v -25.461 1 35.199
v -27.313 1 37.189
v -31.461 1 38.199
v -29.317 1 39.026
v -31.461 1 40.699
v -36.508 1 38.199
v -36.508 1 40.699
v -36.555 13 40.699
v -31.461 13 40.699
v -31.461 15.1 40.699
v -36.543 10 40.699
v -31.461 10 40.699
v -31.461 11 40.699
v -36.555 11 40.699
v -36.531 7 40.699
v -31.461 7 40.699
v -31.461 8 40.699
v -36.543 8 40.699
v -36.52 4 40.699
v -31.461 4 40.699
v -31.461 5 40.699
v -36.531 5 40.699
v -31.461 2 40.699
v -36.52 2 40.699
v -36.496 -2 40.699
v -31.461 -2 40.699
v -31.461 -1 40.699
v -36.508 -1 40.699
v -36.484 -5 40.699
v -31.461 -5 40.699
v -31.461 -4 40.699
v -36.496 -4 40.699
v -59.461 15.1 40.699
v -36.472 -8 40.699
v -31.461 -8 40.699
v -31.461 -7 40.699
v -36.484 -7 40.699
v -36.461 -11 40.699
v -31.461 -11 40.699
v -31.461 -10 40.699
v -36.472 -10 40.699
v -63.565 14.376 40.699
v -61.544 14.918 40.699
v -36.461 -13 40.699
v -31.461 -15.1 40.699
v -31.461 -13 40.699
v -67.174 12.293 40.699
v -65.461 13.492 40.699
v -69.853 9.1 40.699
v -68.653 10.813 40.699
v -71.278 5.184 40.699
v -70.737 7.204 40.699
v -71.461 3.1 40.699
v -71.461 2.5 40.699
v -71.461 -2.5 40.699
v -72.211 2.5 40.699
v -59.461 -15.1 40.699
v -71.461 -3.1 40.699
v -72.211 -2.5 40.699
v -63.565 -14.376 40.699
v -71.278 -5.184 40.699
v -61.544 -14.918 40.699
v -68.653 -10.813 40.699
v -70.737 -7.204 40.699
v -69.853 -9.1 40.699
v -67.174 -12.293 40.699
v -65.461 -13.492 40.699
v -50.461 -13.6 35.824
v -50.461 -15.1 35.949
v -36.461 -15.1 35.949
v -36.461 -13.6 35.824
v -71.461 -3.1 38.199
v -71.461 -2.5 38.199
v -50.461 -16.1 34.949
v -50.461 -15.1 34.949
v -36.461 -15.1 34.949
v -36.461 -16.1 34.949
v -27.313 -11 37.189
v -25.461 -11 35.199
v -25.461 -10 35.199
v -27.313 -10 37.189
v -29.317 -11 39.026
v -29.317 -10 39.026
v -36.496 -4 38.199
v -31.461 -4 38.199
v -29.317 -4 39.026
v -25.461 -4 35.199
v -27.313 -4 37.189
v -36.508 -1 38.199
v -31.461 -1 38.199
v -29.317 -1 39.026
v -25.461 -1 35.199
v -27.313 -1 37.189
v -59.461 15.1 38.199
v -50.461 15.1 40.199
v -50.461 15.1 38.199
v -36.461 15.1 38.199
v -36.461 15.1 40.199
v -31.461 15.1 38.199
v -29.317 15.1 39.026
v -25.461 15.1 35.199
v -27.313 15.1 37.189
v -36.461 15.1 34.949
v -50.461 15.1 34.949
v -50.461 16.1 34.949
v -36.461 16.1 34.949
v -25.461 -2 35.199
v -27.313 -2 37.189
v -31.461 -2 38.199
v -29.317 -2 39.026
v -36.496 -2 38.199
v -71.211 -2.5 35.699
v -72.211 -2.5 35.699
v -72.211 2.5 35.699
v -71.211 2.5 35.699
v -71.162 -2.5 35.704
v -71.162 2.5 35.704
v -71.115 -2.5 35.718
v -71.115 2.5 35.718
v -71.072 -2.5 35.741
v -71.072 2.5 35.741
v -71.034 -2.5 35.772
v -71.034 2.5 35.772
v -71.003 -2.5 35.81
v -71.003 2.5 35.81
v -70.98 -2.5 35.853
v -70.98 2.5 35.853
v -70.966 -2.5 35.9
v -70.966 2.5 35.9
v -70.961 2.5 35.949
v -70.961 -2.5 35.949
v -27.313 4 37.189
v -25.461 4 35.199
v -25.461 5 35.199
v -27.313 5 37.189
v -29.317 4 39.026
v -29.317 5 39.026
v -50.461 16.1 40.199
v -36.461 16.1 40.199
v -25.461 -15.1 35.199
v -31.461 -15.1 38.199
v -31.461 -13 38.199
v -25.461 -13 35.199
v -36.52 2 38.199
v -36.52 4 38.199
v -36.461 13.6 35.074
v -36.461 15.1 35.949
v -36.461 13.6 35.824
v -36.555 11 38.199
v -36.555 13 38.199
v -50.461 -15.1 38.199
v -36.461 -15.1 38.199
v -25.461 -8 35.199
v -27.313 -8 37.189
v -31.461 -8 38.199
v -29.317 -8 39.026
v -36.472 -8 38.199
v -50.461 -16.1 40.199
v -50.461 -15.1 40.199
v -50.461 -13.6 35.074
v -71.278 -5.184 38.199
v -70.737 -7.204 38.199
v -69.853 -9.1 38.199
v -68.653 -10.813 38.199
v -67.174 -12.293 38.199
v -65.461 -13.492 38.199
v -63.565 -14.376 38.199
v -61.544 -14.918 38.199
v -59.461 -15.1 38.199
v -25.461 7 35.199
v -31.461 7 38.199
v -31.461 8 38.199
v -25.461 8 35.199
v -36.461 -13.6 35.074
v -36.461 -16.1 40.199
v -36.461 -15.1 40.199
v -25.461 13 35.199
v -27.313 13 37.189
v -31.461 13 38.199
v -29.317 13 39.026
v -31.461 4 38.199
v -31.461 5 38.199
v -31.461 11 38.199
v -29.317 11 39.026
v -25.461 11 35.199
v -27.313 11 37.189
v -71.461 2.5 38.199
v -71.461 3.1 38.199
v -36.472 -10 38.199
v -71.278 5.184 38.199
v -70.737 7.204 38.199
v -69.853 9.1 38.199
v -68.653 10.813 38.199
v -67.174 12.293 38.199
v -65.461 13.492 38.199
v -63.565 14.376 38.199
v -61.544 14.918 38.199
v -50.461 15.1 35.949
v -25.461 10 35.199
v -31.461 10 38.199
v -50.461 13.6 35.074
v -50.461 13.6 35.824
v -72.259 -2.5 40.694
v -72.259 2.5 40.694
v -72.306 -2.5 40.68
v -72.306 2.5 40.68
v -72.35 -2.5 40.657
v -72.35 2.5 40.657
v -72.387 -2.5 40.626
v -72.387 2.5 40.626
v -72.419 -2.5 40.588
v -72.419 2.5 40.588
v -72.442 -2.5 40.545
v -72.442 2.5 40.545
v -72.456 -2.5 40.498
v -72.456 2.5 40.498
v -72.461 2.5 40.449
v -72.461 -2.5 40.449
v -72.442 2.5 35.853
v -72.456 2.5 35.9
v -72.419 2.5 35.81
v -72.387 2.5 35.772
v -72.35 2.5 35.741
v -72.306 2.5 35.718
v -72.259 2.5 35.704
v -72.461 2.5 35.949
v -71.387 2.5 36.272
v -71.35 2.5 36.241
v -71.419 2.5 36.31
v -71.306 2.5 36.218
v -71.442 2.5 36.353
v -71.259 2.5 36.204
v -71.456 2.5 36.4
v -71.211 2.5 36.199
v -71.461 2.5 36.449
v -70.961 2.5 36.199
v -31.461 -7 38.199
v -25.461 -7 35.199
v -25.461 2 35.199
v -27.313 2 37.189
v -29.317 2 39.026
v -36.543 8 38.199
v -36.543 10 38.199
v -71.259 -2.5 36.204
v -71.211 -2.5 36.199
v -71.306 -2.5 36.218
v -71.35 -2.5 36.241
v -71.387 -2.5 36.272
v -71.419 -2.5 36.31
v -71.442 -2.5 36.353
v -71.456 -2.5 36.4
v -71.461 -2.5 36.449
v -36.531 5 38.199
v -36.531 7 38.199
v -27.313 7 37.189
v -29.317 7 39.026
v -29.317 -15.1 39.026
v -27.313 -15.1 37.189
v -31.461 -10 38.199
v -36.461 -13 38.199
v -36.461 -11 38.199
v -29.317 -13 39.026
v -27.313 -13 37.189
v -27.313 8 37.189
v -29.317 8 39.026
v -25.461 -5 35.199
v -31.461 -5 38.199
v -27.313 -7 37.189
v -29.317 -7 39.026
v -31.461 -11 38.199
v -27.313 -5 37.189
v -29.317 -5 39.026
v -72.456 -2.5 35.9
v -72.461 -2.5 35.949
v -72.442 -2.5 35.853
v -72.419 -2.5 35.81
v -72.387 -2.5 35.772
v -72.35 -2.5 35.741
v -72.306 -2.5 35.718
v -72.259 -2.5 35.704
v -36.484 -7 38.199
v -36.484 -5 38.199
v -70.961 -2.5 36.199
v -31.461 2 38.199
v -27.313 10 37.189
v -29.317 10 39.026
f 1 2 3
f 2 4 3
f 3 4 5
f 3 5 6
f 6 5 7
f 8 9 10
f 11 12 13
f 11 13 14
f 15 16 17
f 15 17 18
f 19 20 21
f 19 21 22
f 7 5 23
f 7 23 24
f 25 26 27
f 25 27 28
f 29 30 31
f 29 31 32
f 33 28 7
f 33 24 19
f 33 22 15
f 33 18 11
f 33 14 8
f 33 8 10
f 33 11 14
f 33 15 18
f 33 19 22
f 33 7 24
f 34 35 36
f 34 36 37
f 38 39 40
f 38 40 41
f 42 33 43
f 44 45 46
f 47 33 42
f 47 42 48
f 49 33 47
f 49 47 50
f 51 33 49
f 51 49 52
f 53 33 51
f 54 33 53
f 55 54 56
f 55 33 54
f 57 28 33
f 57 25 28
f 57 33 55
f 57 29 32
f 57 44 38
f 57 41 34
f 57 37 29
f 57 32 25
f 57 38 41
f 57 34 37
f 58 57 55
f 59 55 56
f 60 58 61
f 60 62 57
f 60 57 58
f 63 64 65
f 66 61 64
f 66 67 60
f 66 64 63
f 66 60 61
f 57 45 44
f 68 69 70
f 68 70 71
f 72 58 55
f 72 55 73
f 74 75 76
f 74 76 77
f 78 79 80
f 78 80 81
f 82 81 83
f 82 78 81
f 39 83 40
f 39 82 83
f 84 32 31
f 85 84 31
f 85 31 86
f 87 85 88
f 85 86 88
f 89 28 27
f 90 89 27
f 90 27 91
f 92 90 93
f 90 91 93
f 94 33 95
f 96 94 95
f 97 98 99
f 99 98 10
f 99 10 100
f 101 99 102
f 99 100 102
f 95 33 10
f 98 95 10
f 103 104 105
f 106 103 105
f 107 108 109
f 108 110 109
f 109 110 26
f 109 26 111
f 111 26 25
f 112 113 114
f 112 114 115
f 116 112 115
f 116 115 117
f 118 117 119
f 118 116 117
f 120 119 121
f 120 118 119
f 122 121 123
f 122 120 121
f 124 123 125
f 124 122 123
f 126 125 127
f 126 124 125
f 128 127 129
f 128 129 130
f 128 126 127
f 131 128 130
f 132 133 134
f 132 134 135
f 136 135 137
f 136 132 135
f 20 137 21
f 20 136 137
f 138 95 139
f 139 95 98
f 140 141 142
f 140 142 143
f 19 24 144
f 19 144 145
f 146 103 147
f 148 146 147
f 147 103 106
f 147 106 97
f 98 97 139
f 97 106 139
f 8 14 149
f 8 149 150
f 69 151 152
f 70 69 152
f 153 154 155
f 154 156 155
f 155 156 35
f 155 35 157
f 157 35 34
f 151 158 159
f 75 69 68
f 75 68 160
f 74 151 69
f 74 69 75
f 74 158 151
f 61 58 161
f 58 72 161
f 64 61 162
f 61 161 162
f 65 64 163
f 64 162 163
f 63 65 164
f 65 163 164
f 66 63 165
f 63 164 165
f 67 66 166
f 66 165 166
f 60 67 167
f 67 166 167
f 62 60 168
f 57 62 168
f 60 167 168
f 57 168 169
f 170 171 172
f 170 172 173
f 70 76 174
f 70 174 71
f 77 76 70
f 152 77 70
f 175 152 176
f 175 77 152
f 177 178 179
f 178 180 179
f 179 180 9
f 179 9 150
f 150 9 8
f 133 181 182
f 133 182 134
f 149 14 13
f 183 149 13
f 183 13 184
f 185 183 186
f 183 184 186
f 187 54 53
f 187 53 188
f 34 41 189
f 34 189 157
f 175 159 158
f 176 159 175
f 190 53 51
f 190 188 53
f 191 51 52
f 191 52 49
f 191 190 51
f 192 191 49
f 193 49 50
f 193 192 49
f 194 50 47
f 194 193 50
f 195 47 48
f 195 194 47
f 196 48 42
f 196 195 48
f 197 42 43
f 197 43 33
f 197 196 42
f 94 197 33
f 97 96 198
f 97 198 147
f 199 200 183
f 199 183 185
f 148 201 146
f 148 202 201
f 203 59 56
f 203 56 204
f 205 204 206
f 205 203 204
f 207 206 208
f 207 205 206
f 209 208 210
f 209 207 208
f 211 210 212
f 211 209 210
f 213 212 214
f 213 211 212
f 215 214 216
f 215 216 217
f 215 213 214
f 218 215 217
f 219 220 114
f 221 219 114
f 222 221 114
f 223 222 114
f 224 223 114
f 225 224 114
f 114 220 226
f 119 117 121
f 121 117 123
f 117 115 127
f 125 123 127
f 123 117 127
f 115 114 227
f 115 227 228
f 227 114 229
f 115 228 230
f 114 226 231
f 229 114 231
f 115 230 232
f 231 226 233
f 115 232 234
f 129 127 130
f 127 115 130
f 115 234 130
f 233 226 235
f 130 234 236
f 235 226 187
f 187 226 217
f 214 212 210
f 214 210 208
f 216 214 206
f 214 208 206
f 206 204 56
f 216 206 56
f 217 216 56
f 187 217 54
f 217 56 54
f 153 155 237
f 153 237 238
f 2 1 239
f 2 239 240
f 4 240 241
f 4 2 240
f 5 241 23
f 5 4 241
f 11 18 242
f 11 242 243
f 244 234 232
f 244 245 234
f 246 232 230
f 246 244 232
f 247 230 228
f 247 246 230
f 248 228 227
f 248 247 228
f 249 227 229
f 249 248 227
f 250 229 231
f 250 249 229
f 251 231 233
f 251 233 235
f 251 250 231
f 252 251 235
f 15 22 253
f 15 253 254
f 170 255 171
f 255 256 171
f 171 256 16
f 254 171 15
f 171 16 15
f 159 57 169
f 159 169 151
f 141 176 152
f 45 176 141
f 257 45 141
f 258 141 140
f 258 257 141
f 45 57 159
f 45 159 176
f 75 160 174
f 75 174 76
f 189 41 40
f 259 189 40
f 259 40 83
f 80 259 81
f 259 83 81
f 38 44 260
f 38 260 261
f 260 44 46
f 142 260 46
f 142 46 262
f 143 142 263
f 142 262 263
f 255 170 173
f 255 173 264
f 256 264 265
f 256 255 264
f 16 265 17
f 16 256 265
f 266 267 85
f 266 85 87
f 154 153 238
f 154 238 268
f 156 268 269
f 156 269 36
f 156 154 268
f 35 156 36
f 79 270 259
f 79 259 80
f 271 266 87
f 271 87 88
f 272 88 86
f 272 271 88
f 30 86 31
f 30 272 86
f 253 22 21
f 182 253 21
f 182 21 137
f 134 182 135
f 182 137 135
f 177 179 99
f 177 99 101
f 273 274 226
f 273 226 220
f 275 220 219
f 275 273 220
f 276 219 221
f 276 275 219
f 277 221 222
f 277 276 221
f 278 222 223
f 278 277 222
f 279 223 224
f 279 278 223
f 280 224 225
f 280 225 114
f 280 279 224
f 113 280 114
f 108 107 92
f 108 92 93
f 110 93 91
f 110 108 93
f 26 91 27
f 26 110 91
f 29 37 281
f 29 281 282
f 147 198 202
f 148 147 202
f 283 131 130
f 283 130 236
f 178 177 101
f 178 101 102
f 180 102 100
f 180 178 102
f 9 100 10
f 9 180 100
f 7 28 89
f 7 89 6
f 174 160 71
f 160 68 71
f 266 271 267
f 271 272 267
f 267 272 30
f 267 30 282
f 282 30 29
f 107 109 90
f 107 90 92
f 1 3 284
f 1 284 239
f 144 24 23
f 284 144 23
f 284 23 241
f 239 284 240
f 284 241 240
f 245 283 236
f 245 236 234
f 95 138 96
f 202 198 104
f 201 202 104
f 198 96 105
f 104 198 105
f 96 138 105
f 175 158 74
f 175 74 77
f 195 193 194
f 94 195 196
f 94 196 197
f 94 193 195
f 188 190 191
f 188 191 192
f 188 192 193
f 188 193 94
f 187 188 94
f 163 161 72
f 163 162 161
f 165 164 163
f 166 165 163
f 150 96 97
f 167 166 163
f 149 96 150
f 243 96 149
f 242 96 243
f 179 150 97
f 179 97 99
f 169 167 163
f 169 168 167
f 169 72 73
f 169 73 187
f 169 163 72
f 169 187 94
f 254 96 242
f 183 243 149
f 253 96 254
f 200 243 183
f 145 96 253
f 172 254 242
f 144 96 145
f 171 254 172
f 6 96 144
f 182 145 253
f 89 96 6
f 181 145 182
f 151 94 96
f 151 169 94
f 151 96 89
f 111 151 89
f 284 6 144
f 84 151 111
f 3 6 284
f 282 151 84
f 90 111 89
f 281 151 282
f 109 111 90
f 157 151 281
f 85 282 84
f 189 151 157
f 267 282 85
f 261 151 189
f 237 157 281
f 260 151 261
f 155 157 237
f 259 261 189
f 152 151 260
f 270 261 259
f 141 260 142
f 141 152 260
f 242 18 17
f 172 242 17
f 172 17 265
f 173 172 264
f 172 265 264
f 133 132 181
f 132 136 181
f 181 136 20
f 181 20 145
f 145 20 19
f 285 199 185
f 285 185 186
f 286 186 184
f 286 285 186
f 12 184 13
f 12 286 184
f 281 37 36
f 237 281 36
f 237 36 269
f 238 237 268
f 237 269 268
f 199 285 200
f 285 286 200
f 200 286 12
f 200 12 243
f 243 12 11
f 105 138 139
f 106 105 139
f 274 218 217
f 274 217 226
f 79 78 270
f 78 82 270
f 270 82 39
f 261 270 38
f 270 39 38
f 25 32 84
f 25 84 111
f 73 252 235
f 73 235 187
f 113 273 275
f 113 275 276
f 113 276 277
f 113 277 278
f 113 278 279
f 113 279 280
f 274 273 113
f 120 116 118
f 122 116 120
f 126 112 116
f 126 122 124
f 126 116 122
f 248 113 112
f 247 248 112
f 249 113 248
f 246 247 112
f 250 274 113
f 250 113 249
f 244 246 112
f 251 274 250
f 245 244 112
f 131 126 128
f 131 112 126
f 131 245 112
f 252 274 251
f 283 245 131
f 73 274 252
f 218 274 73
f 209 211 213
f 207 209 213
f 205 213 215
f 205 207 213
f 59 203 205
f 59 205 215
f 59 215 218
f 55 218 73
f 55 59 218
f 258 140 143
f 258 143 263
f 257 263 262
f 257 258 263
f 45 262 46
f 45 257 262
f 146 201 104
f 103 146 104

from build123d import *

# Parameters (mm, degrees)
F1_DEPTH      = 15.1
F1_DEPTH_BACK = 15.1
F2_DEPTH      = 2.5
F2_DEPTH_BACK = 2.5
F3_W          = 14
F3_H          = 1
F4_DEPTH      = 2
F4_DEPTH_BACK = 4
F6_DEPTH      = 1.5
F7_W          = 5.0940940584
F7_H          = 2
F7_W_2        = 5.0823323011
F7_W_3        = 5.0705705438
F7_W_4        = 5.0588087865
F7_W_5        = 5.0470470292
F7_W_6        = 5.0352852719
F7_W_7        = 5.0235235146
F7_W_8        = 5.0117617573
F7_W_9        = 5
F8_DEPTH      = 6.501
F10_DEPTH     = 15
F11_R         = 12


with BuildPart() as f1:
    # F0 (on Front) → F1 (new body, two sides)
    with BuildSketch(Plane.XZ) as f1_sk:
        with BuildLine():
            Line((-71.4607020907, 40.6989861274), (-71.4607020907, 38.1989861274))
            Line((-71.4607020907, 38.1989861274), (-31.4607020907, 38.1989861274))
            Line((-31.4607020907, 38.1989861274), (-25.4607020907, 35.1989861274))
            ThreePointArc((-25.4607020907, 35.1989861274), (-28.2968833209, 38.1276975126), (-31.4607020907, 40.6989861274))
            Line((-31.4607020907, 40.6989861274), (-71.4607020907, 40.6989861274))
        make_face()
    extrude(amount=F1_DEPTH)
    extrude(f1_sk.sketch, amount=-F1_DEPTH_BACK)

    # F0 (on Front) → F2 (join, two sides)
    with BuildSketch(Plane.XZ) as f2_sk:
        with BuildLine():
            Line((-71.4607020907, 36.4489861274), (-71.4607020907, 38.1989861274))
            Line((-71.4607020907, 38.1989861274), (-71.4607020907, 40.6989861274))
            Line((-71.4607020907, 40.6989861274), (-72.2107020907, 40.6989861274))
            ThreePointArc((-72.2107020907, 40.6989861274), (-72.387478786, 40.6257628227), (-72.4607020907, 40.4489861274))
            Line((-72.4607020907, 40.4489861274), (-72.4607020907, 35.9489861274))
            ThreePointArc((-72.4607020907, 35.9489861274), (-72.387478786, 35.7722094321), (-72.2107020907, 35.6989861274))
            Line((-72.2107020907, 35.6989861274), (-71.2107020907, 35.6989861274))
            ThreePointArc((-71.2107020907, 35.6989861274), (-71.0339253954, 35.7722094321), (-70.9607020907, 35.9489861274))
            Line((-70.9607020907, 35.9489861274), (-70.9607020907, 36.1989861274))
            Line((-70.9607020907, 36.1989861274), (-71.2107020907, 36.1989861274))
            ThreePointArc((-71.2107020907, 36.1989861274), (-71.387478786, 36.2722094321), (-71.4607020907, 36.4489861274))
        make_face()
    extrude(amount=F2_DEPTH)
    extrude(f2_sk.sketch, amount=-F2_DEPTH_BACK)

    # F7 (on face) → F8 (cut, through all)
    with BuildSketch(Plane.XY.offset(40.6989861274)):
        Polygon((-31.4607020907, -10.9998155474), (-31.4607020907, -12.9998155474), (-23.5907521141, -12.9998155474), (-23.6532528544, -10.9998155474), align=None)
        Polygon((-31.4607020907, -7.999838604), (-31.4607020907, -9.999838604), (-23.6025138714, -9.999838604), (-23.6650146117, -7.999838604), align=None)
        Polygon((-23.676776369, -4.9998616605), (-31.4607020907, -4.9998616605), (-31.4607020907, -6.9998616605), (-23.6142756287, -6.9998616605), align=None)
        Polygon((-23.6885381263, -1.9998847171), (-31.4607020907, -1.9998847171), (-31.4607020907, -3.9998847171), (-23.626037386, -3.9998847171), align=None)
        Polygon((-23.7002998836, 1.0000922263), (-31.4607020907, 1.0000922263), (-31.4607020907, -0.9999077737), (-23.6377991433, -0.9999077737), align=None)
        Polygon((-23.7120616409, 4.0000691697), (-31.4607020907, 4.0000691697), (-31.4607020907, 2.0000691697), (-23.6495609006, 2.0000691697), align=None)
        Polygon((-23.7238233982, 7.0000461132), (-31.4607020907, 7.0000461132), (-31.4607020907, 5.0000461132), (-23.6613226579, 5.0000461132), align=None)
        Polygon((-23.7355851555, 10.0000230566), (-31.4607020907, 10.0000230566), (-31.4607020907, 8.0000230566), (-23.6730844152, 8.0000230566), align=None)
        Polygon((-23.6848461725, 11), (-23.7473469128, 13), (-31.4607020907, 13), (-31.4607020907, 11), align=None)
        with Locations((-34.0077491199, 12)):
            Rectangle(F7_W, F7_H)
        with Locations((-34.0018682413, 9.0000230566)):
            Rectangle(F7_W_2, F7_H)
        with Locations((-33.9959873626, 6.0000461132)):
            Rectangle(F7_W_3, F7_H)
        with Locations((-33.990106484, 3.0000691697)):
            Rectangle(F7_W_4, F7_H)
        with Locations((-33.9842256053, 9.22263e-05)):
            Rectangle(F7_W_5, F7_H)
        with Locations((-33.9783447267, -2.9998847171)):
            Rectangle(F7_W_6, F7_H)
        with Locations((-33.972463848, -5.9998616605)):
            Rectangle(F7_W_7, F7_H)
        with Locations((-33.9665829694, -8.999838604)):
            Rectangle(F7_W_8, F7_H)
        with Locations((-33.9607020907, -11.9998155474)):
            Rectangle(F7_W_9, F7_H)
    extrude(amount=-F8_DEPTH, mode=Mode.SUBTRACT)

    # F11
    f11_edges = [f1.edges().sort_by_distance(p)[0] for p in [
        (-71.460702, -15.1, 39.448986),
        (-71.460702, 15.1, 39.448986),
    ]]
    fillet(f11_edges, radius=F11_R)



with BuildPart() as f4:
    # F3 (on face) → F4 (new body, two sides)
    with BuildSketch(Plane(origin=(0, 0, 38.1989861274), x_dir=(1, 0, 0), z_dir=(0, 0, -1))) as f4_sk:
        with Locations((-43.4607020907, -15.6)):
            Rectangle(F3_W, F3_H)
    extrude(amount=-F4_DEPTH)
    extrude(f4_sk.sketch, amount=F4_DEPTH_BACK)

    # F5 (on face) → F6 (join)
    with BuildSketch(Plane.XZ.offset(-15.1)):
        Polygon((-36.4607020907, 34.1989861274), (-36.4607020907, 35.9489861274), (-43.4607020907, 35.9489861274), (-44.4607020907, 34.1989861274), align=None)
        Polygon((-44.4607020907, 34.1989861274), (-43.4607020907, 35.9489861274), (-50.4607020907, 35.9489861274), (-50.4607020907, 34.1989861274), align=None)
    extrude(amount=F6_DEPTH)

    # F9 (on face) → F10 (cut)
    with BuildSketch(Plane(origin=(-50.4607020907, 0, 0), x_dir=(0, -1, 0), z_dir=(-1, 0, 0))):
        Polygon((-15.1, 35.9489861274), (-13.6, 35.8239861274), (-13.6, 35.9489861274), align=None)
        Polygon((-13.6, 35.0739861274), (-15.1, 34.9489861274), (-13.6, 34.9489861274), align=None)
        Polygon((-15.1, 34.9489861274), (-16.1, 34.9489861274), (-16.1, 34.1989861274), (-13.6, 34.1989861274), (-13.6, 34.9489861274), align=None)
    extrude(amount=-F10_DEPTH, mode=Mode.SUBTRACT)


with BuildPart() as f1_1:
    add(f1.part)

    add(f4.part)  # F12 merges F4
    # F12: F4 across plane
    add(f4.part.mirror(Plane.XZ))


solid = f1_1.part
